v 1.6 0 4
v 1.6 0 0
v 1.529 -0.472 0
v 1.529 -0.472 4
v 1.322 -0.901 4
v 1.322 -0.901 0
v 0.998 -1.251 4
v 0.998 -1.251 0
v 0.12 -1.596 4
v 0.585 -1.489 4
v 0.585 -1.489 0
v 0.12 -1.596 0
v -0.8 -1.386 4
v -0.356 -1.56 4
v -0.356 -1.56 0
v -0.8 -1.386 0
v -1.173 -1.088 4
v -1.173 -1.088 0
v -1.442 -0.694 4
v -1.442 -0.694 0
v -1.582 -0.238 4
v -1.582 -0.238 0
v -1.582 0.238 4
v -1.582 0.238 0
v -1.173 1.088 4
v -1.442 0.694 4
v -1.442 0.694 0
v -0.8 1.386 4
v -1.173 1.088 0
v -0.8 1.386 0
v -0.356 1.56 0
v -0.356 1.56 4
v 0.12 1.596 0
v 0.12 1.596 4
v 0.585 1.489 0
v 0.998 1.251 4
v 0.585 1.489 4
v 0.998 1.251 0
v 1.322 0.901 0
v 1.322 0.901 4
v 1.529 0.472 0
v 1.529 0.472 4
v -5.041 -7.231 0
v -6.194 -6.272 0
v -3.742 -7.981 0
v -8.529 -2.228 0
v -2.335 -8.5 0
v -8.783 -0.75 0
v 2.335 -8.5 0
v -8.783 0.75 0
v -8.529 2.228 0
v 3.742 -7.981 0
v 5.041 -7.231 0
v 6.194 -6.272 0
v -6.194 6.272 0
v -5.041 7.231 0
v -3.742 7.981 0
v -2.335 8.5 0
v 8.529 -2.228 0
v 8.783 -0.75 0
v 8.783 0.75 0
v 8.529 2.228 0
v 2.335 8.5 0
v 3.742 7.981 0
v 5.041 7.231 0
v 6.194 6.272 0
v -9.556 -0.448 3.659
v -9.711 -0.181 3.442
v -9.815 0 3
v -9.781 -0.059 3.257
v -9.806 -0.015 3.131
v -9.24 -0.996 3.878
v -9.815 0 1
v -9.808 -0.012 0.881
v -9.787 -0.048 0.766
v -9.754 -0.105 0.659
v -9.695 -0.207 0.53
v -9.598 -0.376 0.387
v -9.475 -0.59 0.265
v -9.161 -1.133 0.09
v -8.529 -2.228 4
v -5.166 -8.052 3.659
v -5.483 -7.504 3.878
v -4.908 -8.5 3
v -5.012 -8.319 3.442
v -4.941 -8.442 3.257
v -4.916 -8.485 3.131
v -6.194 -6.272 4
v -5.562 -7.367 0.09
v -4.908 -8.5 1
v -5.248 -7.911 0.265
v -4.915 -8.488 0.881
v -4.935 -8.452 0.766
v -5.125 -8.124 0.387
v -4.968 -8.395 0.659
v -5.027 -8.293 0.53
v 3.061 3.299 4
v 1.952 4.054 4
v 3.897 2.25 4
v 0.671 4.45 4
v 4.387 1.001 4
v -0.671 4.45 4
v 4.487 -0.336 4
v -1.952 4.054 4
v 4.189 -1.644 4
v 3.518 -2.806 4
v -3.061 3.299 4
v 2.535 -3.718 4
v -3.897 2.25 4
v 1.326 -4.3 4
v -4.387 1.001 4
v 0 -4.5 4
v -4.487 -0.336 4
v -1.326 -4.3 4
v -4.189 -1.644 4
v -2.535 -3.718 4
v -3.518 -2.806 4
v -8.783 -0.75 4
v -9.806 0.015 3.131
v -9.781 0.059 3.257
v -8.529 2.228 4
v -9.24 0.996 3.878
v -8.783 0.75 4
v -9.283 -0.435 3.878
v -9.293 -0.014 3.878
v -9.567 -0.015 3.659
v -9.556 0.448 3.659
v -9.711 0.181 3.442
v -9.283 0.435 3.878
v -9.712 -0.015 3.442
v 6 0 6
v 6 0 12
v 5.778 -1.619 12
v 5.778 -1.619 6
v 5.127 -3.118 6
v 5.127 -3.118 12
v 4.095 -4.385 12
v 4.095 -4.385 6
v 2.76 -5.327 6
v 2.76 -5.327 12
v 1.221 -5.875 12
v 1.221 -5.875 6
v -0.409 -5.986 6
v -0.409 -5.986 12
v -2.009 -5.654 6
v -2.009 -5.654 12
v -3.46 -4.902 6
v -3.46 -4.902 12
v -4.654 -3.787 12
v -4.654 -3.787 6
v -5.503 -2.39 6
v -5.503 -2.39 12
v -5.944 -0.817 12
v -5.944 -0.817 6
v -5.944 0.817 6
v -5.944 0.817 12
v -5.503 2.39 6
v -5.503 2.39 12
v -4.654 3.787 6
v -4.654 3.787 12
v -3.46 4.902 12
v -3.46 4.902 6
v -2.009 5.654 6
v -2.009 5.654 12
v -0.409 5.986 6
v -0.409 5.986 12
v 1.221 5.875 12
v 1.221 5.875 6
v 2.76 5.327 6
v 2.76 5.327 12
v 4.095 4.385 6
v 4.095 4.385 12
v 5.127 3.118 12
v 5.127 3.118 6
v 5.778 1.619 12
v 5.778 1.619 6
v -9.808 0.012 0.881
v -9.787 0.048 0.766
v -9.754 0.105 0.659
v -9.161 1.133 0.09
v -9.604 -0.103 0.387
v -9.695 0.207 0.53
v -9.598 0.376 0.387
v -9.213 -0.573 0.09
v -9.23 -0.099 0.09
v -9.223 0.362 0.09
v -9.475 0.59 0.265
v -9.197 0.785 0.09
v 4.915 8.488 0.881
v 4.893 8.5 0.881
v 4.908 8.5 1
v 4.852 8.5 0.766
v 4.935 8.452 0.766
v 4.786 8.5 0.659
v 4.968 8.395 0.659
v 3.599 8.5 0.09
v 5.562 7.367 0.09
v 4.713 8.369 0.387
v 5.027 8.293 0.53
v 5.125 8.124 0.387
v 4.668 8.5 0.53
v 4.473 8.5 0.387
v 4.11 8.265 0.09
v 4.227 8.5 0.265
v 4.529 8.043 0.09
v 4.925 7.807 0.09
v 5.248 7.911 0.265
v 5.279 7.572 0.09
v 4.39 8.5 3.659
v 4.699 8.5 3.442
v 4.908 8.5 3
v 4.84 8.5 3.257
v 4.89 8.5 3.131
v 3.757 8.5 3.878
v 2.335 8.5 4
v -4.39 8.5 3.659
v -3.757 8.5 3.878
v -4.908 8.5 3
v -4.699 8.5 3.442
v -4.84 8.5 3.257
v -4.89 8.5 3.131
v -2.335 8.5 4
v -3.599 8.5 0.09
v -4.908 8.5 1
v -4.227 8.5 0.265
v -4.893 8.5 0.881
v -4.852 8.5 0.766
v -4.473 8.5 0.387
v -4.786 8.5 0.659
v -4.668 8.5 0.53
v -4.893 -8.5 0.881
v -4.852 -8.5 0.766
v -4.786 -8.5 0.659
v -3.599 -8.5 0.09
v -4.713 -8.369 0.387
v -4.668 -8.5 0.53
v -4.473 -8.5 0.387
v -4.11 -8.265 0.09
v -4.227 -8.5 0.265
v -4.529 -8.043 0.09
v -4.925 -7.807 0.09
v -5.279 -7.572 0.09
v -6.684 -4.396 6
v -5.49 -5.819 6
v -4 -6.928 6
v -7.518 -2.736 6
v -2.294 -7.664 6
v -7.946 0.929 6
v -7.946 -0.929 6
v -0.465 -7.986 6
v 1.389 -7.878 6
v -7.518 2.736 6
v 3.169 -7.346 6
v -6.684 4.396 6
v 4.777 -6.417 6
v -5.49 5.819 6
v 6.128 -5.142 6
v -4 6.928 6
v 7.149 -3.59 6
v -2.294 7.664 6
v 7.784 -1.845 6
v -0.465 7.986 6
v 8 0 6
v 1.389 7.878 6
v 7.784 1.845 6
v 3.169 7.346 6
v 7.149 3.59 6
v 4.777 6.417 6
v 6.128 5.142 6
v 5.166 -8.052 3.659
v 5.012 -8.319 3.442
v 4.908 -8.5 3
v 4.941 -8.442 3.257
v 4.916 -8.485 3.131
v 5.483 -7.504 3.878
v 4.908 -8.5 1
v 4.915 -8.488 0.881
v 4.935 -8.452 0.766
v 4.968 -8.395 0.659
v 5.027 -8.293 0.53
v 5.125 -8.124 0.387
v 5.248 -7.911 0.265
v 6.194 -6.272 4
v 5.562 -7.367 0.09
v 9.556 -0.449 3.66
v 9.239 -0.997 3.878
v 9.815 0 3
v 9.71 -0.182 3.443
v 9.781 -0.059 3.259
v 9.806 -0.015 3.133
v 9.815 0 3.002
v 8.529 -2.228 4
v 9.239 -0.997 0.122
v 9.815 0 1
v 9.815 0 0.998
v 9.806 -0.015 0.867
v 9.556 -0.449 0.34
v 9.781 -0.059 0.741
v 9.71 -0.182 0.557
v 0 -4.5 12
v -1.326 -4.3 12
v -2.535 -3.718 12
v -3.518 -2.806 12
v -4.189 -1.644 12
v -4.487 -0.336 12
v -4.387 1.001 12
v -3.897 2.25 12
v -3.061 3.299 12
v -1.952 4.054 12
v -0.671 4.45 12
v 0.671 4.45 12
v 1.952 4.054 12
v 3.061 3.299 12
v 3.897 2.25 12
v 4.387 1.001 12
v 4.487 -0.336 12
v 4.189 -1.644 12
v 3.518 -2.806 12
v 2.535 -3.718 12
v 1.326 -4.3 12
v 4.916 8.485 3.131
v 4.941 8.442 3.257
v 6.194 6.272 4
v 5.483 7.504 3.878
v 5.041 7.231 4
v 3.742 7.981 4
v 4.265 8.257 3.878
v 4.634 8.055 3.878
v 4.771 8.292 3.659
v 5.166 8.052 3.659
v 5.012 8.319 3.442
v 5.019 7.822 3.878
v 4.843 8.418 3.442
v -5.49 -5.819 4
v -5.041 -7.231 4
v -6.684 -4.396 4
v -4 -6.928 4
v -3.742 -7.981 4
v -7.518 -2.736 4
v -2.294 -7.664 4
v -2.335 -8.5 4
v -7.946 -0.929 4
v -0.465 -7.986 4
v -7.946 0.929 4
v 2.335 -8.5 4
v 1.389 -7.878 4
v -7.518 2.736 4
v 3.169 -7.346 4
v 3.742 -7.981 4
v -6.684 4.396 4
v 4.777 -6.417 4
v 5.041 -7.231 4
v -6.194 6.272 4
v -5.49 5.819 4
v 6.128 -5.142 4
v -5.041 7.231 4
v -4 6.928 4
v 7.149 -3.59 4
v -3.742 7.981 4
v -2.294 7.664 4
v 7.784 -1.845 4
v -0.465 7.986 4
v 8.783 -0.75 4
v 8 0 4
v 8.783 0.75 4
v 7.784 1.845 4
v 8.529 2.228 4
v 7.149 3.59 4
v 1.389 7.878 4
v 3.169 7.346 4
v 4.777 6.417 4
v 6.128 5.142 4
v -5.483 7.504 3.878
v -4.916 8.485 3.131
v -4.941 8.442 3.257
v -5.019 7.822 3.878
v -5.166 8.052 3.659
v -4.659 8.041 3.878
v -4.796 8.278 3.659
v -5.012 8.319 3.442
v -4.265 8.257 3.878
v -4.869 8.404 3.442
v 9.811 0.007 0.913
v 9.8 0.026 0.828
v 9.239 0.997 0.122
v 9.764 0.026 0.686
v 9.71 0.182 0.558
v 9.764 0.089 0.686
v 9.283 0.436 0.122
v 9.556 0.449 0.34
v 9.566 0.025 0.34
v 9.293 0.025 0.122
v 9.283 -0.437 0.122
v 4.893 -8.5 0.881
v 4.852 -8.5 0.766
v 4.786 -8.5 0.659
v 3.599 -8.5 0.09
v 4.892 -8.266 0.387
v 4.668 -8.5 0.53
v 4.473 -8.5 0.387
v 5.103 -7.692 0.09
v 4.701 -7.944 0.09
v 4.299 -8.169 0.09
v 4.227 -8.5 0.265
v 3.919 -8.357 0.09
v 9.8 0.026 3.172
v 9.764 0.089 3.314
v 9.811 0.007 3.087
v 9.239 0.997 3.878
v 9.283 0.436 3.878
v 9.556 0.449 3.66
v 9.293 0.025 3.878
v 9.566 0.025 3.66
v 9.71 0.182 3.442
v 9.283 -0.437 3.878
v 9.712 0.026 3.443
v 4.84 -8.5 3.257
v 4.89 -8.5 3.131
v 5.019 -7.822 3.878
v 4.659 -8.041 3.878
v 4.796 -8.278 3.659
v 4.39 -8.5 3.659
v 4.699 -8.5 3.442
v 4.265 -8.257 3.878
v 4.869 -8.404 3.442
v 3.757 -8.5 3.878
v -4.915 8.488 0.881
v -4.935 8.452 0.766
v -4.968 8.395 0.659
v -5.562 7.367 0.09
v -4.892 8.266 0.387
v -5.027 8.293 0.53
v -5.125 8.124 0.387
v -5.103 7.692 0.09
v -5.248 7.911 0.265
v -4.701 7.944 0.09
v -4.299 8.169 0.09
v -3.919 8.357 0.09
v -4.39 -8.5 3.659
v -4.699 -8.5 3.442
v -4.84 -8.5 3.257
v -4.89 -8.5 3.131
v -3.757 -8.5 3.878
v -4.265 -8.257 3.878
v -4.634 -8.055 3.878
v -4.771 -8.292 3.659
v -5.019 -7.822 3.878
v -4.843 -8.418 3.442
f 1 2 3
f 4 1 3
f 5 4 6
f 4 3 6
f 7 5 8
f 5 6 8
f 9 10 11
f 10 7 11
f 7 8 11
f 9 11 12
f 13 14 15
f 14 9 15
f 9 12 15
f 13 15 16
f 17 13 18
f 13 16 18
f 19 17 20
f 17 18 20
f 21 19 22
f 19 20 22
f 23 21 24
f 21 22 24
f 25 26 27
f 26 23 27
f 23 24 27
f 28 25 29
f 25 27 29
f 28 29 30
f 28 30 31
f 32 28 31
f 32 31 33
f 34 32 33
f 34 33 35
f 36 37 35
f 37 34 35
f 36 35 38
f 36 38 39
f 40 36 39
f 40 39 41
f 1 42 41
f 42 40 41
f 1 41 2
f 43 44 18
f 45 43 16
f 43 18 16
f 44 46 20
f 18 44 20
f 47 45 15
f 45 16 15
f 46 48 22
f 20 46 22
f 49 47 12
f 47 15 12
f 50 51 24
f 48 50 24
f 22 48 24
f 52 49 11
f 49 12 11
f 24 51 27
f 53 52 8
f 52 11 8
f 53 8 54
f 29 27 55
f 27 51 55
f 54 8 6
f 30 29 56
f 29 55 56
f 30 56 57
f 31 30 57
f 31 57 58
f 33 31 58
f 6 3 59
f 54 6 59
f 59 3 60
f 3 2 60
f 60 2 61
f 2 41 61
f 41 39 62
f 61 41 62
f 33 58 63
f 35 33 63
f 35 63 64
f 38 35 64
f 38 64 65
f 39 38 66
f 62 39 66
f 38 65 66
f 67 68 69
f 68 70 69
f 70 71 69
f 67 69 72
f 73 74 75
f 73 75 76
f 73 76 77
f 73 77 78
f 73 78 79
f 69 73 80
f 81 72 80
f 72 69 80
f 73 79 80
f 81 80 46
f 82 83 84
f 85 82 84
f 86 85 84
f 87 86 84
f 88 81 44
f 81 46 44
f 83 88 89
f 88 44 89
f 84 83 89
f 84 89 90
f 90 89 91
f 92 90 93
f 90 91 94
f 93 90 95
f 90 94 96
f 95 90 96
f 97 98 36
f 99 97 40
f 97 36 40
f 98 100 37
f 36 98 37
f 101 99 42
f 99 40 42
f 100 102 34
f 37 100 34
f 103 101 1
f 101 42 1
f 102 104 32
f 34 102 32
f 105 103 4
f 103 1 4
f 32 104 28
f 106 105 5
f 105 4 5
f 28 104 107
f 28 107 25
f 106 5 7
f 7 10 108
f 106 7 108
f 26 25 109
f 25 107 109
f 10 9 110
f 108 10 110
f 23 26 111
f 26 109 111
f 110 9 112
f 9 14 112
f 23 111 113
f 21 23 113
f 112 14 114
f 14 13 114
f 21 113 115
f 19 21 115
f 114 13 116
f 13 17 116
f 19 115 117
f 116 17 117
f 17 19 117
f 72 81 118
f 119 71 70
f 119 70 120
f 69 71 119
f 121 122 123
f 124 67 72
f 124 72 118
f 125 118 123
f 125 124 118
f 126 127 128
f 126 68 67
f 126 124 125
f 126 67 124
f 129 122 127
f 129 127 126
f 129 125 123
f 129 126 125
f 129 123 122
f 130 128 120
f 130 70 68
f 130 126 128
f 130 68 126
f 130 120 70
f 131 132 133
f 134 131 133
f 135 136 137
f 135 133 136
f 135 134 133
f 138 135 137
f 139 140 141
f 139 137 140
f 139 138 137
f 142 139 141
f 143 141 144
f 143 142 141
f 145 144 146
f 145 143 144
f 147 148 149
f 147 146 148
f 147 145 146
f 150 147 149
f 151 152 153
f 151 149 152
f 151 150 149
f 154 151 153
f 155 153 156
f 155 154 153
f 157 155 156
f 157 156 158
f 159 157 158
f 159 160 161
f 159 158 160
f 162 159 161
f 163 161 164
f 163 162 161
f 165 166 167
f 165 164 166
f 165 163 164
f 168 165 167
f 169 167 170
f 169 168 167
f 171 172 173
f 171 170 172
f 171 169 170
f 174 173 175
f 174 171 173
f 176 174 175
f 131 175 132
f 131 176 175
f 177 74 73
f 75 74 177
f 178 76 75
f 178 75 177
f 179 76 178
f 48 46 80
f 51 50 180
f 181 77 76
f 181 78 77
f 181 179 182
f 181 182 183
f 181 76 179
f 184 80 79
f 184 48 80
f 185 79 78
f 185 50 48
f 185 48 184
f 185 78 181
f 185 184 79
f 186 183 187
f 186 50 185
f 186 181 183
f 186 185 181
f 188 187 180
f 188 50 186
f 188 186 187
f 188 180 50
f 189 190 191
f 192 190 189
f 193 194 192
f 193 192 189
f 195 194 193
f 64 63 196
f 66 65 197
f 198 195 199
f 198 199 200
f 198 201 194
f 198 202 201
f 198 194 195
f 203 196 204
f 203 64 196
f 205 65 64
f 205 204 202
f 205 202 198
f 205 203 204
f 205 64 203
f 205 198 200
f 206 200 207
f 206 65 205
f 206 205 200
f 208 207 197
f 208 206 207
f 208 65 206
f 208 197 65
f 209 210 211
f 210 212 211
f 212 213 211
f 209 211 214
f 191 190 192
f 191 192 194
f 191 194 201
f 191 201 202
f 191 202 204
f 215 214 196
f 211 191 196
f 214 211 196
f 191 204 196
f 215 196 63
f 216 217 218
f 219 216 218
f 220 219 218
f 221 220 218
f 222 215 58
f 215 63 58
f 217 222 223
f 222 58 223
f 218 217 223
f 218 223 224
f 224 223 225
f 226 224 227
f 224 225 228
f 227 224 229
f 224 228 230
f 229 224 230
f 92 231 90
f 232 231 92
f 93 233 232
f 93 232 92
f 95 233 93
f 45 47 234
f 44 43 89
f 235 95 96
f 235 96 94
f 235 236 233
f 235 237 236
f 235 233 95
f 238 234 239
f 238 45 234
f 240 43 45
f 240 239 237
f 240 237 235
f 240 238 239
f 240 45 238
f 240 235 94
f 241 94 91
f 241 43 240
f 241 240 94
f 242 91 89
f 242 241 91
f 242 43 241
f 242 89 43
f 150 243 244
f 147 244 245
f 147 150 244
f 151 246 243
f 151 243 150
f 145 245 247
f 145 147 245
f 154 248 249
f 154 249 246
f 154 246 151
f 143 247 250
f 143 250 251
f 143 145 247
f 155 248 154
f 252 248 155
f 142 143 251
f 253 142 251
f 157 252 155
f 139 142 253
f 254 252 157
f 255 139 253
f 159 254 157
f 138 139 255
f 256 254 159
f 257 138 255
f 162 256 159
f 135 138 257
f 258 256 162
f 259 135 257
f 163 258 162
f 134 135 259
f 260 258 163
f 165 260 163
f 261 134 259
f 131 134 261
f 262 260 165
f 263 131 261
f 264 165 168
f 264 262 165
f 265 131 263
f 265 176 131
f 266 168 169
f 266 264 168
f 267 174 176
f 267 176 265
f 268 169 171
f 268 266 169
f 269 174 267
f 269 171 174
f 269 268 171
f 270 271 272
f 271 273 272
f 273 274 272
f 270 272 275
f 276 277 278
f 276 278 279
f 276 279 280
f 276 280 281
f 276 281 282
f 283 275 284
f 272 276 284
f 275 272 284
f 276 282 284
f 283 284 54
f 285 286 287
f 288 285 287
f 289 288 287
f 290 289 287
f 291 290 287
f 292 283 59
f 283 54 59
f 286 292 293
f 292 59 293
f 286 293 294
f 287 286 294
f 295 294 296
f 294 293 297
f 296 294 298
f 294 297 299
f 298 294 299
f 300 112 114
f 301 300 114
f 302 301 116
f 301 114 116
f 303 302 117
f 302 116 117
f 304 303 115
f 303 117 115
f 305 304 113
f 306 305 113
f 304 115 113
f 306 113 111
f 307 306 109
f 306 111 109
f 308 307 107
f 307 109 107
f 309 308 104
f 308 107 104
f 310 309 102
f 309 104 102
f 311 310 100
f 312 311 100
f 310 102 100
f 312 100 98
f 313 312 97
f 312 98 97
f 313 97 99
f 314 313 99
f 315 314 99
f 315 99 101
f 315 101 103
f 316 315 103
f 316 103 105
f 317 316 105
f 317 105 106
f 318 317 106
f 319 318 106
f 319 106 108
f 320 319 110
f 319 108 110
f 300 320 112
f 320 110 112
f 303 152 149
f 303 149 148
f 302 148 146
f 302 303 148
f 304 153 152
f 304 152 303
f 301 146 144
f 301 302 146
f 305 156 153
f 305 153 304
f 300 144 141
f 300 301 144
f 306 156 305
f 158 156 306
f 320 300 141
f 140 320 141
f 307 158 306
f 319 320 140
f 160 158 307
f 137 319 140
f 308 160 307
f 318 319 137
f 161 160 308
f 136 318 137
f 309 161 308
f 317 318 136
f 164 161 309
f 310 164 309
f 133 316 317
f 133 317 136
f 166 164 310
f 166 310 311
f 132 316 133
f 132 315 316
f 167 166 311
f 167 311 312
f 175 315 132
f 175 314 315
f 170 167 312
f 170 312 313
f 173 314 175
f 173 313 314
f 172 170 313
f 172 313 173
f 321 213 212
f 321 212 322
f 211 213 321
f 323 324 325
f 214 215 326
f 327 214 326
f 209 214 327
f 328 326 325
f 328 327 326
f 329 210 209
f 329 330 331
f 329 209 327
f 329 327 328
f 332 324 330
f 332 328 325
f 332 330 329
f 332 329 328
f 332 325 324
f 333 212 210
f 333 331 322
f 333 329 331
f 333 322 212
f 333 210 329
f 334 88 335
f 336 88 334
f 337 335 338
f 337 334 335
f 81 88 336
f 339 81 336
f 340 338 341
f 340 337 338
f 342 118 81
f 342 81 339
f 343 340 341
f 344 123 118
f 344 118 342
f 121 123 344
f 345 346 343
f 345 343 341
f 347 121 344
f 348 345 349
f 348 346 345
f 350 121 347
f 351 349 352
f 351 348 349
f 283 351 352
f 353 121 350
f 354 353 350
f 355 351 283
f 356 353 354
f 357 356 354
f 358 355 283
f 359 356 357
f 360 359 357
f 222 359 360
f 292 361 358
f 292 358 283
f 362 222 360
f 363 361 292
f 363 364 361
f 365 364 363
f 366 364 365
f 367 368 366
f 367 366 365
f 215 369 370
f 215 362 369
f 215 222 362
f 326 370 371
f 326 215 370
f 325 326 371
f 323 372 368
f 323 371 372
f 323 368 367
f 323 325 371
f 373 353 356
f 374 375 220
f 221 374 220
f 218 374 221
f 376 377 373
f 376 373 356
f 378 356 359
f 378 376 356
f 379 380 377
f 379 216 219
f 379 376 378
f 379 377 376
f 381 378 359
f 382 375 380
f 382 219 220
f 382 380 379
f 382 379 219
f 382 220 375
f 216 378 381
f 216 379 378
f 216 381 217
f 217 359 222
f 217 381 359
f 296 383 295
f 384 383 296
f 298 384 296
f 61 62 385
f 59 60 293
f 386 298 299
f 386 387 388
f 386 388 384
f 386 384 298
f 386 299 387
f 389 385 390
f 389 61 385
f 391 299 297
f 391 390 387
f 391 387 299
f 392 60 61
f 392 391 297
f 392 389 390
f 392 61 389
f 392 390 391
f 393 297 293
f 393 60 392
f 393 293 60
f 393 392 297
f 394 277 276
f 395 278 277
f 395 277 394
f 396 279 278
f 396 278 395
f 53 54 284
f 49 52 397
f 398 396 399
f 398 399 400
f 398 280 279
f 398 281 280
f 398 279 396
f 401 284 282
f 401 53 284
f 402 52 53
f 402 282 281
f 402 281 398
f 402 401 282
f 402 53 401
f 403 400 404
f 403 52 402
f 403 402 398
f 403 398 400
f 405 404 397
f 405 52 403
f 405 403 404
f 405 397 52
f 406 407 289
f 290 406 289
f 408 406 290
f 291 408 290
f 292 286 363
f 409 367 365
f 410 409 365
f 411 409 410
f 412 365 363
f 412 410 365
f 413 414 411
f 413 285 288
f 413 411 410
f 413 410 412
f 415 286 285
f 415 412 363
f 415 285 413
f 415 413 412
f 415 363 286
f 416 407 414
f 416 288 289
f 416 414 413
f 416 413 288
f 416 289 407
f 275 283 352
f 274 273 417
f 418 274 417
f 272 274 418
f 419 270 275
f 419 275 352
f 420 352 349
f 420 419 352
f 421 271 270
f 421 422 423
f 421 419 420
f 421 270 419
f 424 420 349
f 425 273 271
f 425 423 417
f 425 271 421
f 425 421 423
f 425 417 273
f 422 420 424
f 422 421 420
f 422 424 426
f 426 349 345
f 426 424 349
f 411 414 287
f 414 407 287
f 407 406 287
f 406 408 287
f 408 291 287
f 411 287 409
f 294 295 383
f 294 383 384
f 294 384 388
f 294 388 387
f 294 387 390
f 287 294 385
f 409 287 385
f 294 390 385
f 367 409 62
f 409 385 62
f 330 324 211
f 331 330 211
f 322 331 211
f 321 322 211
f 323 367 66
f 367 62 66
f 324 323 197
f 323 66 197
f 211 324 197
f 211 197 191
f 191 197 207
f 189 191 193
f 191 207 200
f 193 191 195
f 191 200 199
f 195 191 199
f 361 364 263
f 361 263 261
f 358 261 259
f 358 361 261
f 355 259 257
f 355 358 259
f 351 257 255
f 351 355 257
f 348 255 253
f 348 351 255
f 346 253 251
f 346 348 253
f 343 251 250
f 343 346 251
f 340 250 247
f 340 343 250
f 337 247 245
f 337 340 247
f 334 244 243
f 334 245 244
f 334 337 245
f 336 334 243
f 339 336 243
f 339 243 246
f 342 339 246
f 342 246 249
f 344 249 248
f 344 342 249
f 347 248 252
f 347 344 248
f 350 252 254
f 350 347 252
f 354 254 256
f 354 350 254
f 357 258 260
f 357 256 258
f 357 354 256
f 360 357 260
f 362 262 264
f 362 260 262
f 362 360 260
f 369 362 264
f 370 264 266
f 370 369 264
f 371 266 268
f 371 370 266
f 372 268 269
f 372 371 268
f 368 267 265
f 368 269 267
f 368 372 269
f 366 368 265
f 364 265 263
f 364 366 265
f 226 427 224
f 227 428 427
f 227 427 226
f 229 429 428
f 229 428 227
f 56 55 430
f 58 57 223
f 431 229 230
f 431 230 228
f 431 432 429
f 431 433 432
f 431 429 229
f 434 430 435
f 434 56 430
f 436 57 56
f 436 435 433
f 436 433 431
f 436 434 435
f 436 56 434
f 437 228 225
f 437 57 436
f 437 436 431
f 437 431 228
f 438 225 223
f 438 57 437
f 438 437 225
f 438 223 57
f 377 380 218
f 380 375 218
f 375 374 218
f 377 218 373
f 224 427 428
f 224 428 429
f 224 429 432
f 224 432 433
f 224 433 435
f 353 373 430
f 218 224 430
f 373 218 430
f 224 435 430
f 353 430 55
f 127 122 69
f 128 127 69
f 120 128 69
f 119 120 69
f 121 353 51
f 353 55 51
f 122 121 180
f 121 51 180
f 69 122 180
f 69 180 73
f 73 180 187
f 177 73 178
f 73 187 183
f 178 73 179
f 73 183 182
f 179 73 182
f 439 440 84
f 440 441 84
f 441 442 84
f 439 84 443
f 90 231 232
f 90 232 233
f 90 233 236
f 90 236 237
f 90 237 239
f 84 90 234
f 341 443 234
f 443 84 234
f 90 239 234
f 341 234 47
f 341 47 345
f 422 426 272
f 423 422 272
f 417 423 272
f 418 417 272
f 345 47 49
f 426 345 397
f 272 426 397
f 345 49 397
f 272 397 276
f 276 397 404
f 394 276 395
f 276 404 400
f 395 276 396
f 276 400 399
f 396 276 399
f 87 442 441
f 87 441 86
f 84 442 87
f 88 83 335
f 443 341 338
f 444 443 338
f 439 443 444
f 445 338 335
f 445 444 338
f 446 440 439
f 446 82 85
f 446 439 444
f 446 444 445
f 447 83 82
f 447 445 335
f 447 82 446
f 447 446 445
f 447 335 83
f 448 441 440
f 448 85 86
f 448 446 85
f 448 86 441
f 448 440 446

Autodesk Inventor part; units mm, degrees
ref_plane "YZ Plane" through (0, 0, 0) normal (1, 0, 0) x (0, 1, 0)
ref_plane "XZ Plane" through (0, 0, 0) normal (0, 1, 0) x (-1, 0, 0)
ref_plane "XY Plane" through (0, 0, 0) normal (0, 0, 1) x (1, 0, 0)
sketch "Sketch1" plane through (0, 0, 0) normal (0, 0, 1) x (1, 0, 0)
  circle A0 centre (0, 0) radius 1.6
  line L0 (9.815, 0) -> (4.9075, -8.5)
  line L1 (4.9075, -8.5) -> (-4.9075, -8.5)
  line L2 (-4.9075, -8.5) -> (-9.815, 0)
  line L3 (-9.815, 0) -> (-4.9075, 8.5)
  line L4 (-4.9075, 8.5) -> (4.9075, 8.5)
  line L5 (4.9075, 8.5) -> (9.815, 0)
  circle A1 centre (0, 0) radius 9.815
  point P0 (-9.815, 0)
  point P1 (-9.815, 0)
  dimension "d0" = 3.2
  dimension "d1" = 17
extrude "Extrusion1" add sketch "Sketch1" along normal blind 4
sketch "Sketch2" plane through (0, 0, 4) normal (0, 0, 1) x (1, 0, 0)
  circle A0 centre (0, 0) radius 8
  dimension "d4" = 16
extrude "Extrusion2" add sketch "Sketch2" along normal blind 2
sketch "Sketch3" plane through (0, 0, 6) normal (0, 0, 1) x (1, 0, 0)
  circle A0 centre (0, 0) radius 6
  dimension "d7" = 12
extrude "Extrusion3" add sketch "Sketch3" along normal blind 6
thread "Thread1" size "M12x0.5" class "6g" standard "ANSI Metric M Profile" full length
sketch "Sketch4" plane through (0, 0, 12) normal (0, 0, 1) x (1, 0, 0)
  circle A0 centre (0, 0) radius 6 projected
hole "Hole1" at (0, 0, 12) direction (0, 0, -1) diameter 9 depth 8
fillet "Fillet1" radius 1 2 edges at (4.9075, 8.5, 0) (4.9075, 8.5, 4)
sketch "Sketch5" plane through (0, 0, 0) normal (0, 0, -1) x (-1, 0, 0)
  circle A0 centre (0, 0) radius 1.6 projected
  circle A1 centre (0, 0) radius 9.815 projected
  line L0 (9.815, 0) -> (4.9075, -8.5)
  line L1 (4.9075, -8.5) -> (-4.9075, -8.5)
  line L2 (-4.9075, -8.5) -> (-9.815, 0)
  line L3 (-9.815, 0) -> (-4.9075, 8.5)
  line L4 (-4.9075, 8.5) -> (4.9075, 8.5)
  line L5 (4.9075, 8.5) -> (9.815, 0)
  point P0 (-9.815, 0)
  point P1 (-9.815, 0)
extrude "Extrusion4" cut sketch "Sketch5" against normal blind 5 contours L5 A1 | A1 L0 | L4 A1 | A1 L1 | L3 A1 | A1 L2
properties part number "fix-screw"
